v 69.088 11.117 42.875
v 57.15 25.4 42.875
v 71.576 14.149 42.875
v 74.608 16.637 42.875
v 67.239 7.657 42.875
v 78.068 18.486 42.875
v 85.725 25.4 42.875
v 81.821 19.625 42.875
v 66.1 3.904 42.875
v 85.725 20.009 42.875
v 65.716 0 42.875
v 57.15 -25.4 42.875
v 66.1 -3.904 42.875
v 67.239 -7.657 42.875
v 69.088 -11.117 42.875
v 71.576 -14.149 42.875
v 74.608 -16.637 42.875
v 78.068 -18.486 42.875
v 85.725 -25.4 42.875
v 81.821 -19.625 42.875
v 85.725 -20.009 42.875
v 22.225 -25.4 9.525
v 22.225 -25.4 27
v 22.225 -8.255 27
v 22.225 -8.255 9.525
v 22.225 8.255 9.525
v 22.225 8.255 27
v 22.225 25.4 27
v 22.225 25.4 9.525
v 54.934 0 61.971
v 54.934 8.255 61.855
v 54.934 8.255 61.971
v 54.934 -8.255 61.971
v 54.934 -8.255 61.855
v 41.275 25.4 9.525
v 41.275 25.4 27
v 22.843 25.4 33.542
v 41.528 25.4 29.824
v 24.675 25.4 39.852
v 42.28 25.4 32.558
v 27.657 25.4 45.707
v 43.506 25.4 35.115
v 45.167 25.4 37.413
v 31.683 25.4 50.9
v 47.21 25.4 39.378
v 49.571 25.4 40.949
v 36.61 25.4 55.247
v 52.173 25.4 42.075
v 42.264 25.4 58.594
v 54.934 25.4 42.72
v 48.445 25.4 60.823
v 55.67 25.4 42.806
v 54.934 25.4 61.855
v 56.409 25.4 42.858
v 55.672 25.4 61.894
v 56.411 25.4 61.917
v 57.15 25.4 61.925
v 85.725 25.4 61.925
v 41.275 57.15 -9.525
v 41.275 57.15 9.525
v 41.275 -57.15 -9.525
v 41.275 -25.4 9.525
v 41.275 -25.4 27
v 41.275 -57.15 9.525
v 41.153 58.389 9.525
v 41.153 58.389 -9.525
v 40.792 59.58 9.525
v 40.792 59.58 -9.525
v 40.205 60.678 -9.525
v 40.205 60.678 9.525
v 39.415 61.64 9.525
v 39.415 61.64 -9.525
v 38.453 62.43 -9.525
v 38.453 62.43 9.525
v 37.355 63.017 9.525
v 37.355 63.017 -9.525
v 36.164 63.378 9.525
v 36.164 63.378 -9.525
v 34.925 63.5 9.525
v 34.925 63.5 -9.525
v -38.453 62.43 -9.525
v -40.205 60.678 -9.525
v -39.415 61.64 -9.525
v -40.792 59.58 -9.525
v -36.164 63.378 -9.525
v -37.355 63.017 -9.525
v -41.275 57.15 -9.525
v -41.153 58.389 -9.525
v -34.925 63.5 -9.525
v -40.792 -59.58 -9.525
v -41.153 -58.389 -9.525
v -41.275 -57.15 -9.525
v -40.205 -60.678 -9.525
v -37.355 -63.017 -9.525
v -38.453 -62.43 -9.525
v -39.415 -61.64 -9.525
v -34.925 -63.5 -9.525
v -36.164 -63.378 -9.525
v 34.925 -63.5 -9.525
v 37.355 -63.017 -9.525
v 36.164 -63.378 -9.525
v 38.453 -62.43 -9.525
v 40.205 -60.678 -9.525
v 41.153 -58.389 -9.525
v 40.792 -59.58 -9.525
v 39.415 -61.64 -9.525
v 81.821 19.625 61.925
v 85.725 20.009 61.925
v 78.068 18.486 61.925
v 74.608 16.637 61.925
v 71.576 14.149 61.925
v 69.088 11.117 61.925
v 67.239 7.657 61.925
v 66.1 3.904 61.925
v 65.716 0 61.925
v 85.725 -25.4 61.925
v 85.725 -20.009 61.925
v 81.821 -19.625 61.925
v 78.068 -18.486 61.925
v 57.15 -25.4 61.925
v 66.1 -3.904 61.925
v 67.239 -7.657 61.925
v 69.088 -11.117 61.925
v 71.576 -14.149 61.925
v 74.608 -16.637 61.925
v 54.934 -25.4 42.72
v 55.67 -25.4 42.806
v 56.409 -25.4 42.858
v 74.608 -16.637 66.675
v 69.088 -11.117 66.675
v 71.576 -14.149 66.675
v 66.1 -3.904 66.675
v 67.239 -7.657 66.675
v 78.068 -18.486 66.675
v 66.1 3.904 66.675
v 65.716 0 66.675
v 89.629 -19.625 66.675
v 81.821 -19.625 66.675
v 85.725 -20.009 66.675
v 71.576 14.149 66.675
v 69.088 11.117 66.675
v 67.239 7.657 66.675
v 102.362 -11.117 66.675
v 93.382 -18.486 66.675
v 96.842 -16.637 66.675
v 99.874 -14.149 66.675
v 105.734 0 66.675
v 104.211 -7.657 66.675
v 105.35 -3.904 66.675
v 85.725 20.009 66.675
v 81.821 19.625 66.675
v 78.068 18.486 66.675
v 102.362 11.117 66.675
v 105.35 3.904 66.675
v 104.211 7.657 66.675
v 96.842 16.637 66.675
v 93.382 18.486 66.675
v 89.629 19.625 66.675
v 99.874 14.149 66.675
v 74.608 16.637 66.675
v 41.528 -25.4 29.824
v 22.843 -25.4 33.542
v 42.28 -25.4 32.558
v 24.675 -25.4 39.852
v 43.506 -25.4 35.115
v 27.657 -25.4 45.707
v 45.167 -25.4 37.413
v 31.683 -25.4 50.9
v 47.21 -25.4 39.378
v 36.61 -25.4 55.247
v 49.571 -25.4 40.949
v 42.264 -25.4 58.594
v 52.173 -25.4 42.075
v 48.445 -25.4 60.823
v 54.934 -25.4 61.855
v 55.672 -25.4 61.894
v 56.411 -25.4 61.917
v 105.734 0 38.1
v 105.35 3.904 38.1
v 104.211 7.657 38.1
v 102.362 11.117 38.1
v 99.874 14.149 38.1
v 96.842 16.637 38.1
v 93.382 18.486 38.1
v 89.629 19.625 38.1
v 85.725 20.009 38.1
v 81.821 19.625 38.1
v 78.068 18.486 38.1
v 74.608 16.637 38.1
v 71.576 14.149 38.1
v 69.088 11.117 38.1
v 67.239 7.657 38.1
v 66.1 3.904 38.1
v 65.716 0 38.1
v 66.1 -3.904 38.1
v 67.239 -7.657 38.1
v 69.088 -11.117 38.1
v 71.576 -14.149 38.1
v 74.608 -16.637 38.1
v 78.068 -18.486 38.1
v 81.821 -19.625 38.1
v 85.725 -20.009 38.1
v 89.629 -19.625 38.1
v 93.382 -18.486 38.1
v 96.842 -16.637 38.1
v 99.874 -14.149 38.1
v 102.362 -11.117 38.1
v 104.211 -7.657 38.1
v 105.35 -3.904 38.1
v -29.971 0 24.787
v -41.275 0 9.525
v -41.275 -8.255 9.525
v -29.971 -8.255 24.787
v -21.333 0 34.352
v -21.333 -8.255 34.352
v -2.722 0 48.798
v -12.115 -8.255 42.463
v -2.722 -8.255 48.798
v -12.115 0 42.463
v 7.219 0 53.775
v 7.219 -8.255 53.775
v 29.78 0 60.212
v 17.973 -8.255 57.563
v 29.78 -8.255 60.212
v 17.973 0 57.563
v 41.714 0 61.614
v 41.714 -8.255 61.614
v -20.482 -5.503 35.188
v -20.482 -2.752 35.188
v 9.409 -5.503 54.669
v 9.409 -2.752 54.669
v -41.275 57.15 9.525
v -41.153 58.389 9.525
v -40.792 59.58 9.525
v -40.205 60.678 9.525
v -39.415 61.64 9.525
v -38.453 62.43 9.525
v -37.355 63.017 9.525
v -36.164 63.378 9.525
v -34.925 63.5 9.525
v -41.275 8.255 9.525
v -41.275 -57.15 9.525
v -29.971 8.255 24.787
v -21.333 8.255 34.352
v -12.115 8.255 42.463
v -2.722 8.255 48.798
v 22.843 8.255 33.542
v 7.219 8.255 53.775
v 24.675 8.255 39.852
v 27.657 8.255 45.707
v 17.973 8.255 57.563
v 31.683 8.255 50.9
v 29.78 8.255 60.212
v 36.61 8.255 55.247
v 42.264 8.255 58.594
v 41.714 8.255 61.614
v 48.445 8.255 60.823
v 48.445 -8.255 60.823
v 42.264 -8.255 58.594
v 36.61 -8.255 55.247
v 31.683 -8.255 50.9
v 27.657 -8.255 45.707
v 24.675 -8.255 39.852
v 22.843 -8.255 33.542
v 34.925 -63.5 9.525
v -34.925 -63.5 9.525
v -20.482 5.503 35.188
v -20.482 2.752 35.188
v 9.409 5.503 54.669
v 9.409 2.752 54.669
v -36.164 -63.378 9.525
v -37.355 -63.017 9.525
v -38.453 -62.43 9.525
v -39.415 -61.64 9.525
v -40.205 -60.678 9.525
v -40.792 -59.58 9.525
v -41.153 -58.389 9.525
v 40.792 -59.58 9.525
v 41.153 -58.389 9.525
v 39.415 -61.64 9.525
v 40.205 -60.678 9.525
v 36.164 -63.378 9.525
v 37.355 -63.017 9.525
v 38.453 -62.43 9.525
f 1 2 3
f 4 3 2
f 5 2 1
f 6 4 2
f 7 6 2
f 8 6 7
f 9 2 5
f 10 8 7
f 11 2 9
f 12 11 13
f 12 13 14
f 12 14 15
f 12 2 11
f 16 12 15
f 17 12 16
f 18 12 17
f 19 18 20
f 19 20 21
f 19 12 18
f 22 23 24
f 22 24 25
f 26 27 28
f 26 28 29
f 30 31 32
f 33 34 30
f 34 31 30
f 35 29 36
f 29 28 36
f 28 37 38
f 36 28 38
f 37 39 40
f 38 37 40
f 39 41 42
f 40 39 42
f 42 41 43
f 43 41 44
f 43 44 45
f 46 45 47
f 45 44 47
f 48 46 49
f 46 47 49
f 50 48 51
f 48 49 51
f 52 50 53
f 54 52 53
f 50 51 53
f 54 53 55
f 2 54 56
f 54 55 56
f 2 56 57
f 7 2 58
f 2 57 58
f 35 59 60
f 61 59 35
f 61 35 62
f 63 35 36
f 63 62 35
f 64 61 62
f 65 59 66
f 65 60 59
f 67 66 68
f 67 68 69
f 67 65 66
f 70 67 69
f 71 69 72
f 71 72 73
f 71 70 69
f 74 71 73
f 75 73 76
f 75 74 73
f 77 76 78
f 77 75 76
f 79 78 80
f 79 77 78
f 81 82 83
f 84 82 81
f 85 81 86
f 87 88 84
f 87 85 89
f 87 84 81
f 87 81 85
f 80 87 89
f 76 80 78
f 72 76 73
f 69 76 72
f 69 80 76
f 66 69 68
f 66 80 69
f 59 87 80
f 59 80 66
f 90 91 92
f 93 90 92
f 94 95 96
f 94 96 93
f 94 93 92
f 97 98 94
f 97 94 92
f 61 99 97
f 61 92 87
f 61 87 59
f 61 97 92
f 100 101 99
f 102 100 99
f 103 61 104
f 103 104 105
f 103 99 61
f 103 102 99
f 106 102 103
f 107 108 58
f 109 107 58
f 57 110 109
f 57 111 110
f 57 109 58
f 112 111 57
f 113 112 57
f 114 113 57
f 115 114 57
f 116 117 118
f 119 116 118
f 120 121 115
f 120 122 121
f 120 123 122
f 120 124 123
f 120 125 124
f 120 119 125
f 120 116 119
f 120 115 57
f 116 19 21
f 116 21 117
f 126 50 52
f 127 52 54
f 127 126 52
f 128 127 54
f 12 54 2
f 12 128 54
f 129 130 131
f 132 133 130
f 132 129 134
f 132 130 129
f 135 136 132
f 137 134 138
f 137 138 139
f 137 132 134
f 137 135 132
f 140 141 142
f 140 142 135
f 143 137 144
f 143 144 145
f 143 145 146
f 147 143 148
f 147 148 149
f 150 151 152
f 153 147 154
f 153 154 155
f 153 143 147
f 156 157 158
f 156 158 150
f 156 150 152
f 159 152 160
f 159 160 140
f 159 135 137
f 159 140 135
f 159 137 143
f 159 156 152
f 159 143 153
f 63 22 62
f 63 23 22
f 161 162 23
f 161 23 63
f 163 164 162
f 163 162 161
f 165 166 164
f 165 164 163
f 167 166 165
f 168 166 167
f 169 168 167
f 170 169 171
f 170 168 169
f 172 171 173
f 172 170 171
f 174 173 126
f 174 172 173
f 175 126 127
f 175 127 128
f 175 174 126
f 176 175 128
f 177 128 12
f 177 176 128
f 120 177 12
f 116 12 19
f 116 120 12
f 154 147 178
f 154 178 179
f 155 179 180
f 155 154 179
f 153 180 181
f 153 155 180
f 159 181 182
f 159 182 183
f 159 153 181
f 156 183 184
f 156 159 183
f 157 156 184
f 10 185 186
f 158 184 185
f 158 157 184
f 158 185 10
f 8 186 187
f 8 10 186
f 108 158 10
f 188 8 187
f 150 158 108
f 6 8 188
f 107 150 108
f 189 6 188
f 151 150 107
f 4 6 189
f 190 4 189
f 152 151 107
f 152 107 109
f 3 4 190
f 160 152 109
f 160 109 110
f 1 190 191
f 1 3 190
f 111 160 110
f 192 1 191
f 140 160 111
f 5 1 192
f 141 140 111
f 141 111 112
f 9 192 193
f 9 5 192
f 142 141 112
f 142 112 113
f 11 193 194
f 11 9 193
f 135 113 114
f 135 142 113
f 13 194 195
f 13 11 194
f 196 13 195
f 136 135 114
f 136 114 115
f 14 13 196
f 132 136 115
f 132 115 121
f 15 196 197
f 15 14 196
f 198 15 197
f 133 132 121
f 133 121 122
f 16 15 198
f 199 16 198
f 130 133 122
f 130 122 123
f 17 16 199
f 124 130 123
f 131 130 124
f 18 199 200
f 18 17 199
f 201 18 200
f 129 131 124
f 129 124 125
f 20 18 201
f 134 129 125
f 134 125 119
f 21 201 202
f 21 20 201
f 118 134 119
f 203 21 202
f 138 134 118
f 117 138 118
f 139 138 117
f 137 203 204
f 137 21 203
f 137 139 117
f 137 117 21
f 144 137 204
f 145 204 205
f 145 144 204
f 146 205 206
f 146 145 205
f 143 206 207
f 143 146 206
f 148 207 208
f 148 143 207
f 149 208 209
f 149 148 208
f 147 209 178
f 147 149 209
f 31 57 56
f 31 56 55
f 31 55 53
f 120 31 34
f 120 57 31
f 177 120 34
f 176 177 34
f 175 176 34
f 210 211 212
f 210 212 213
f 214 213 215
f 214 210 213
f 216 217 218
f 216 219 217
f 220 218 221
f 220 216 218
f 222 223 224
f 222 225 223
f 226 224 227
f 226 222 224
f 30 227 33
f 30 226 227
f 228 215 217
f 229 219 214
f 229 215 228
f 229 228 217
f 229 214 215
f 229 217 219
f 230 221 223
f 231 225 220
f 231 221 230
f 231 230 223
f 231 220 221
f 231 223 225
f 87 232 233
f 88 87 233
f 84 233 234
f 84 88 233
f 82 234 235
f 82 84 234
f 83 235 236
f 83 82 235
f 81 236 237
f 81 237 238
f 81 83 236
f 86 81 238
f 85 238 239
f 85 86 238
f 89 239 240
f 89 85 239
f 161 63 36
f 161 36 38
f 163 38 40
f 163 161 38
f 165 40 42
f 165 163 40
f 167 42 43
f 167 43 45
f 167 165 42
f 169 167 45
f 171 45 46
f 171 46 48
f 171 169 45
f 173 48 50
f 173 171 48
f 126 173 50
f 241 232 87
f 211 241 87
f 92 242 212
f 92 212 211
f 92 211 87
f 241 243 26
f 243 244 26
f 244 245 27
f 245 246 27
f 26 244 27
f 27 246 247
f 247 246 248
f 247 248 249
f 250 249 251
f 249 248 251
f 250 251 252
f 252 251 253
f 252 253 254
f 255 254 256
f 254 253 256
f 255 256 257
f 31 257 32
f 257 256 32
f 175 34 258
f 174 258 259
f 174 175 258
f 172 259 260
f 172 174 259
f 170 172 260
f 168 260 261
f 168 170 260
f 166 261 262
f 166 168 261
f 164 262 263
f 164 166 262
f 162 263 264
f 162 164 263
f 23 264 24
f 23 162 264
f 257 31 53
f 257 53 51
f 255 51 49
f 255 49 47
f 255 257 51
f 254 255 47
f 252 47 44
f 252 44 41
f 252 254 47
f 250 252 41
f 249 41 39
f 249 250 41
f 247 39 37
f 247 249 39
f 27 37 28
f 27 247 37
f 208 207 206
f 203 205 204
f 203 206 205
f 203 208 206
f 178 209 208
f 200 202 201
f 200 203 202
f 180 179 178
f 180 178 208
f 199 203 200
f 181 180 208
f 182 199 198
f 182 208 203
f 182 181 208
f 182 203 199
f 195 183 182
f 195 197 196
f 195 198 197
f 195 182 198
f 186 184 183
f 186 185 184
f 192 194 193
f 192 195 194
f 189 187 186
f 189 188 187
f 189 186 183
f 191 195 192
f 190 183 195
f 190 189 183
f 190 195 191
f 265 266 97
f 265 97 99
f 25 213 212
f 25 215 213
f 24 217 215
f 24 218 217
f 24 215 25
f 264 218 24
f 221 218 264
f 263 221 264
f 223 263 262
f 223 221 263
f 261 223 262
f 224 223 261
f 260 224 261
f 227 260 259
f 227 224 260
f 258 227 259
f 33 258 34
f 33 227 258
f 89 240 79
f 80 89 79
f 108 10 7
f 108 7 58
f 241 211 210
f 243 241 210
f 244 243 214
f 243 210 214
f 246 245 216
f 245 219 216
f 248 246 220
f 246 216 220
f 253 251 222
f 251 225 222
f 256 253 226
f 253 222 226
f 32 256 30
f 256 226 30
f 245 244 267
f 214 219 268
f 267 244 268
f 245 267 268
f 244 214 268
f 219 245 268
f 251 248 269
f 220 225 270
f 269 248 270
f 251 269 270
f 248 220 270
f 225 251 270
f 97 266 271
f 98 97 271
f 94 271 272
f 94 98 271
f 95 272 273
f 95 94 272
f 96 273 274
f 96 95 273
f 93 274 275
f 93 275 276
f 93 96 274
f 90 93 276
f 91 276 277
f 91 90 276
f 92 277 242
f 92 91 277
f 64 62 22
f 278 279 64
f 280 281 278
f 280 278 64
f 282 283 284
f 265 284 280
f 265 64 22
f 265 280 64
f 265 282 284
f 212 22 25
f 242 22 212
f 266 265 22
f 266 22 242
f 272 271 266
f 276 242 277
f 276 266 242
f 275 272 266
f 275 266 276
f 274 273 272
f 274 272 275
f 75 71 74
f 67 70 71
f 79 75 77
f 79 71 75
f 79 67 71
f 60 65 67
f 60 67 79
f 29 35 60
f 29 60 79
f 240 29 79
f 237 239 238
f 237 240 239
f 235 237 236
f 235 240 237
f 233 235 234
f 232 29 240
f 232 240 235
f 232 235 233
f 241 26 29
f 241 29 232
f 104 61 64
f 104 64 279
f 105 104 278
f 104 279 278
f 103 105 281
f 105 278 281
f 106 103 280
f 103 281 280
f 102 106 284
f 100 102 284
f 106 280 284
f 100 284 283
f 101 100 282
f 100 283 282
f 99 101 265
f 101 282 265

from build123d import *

# Parameters (mm, degrees)
F1_DEPTH = 63.5
F2_DEPTH = 25.4
F3_DEPTH = 8.255
F5_R     = 6.35


with BuildPart() as f1:
    # F0 (on Front) → F1 (new body, symmetric)
    with BuildSketch(Plane.XZ):
        Polygon((41.275, -9.525), (41.275, 9.525), (22.225, 9.525), (-41.275, 9.525), (-41.275, -9.525), align=None)
    extrude(amount=F1_DEPTH, both=True)

    # F0 (on Front) → F2 (join, symmetric)
    with BuildSketch(Plane.XZ):
        with BuildLine():
            Line((22.225, 9.525), (41.275, 9.525))
            Line((41.275, 9.525), (41.275, 27.0002))
            ThreePointArc((41.275, 27.0002), (45.166907, 37.412746), (54.934352, 42.719822))
            Line((54.934352, 42.719822), (54.934352, 61.854849))
            ThreePointArc((54.934352, 61.854849), (31.682991, 50.89972), (22.225, 27.0002))
            Line((22.225, 27.0002), (22.225, 9.525))
        make_face()
        with BuildLine():
            Line((54.934352, 61.854849), (54.934352, 42.719822))
            ThreePointArc((54.934352, 42.719822), (56.039455, 42.836308), (57.15, 42.8752))
            Line((57.15, 42.8752), (85.725, 42.8752))
            Line((85.725, 42.8752), (85.725, 61.9252))
            Line((85.725, 61.9252), (57.15, 61.9252))
            ThreePointArc((57.15, 61.9252), (56.041618, 61.907608), (54.934352, 61.854849))
        make_face()
    extrude(amount=F2_DEPTH, both=True)

    # F0 (on Front) → F3 (join, symmetric)
    with BuildSketch(Plane.XZ):
        with BuildLine():
            Line((-41.275, 9.525), (22.225, 9.525))
            Line((22.225, 9.525), (22.225, 27.0002))
            ThreePointArc((22.225, 27.0002), (31.682991, 50.89972), (54.934352, 61.854849))
            Line((54.934352, 61.854849), (54.934352, 61.970605))
            add(Edge.make_bspline(
                [(-41.275, 9.525), (-22.851193, 36.281686), (-0.588278, 62.756125), (54.934352, 61.970605)],
                knots=[0, 0, 0, 0, 110.052173, 110.052173, 110.052173, 110.052173], degree=3))
        make_face()
    extrude(amount=F3_DEPTH, both=True)

    # F0 (on Front) → F4 (revolve)
    with BuildSketch(Plane.XZ):
        Polygon((85.725, 42.8752), (85.725, 38.1), (105.734352, 38.1), (105.734352, 66.675), (85.725, 66.675), (85.725, 61.9252), align=None)
    revolve(axis=Axis((85.725, 0, 52.3875), (0, 0, 1)))

    # F5
    f5_edges = [f1.edges().sort_by_distance(p)[0] for p in [
        (41.275, -63.5, 0),
        (-41.275, -63.5, 0),
        (-41.275, 63.5, 0),
        (41.275, 63.5, 0),
    ]]
    fillet(f5_edges, radius=F5_R)


solid = f1.part
